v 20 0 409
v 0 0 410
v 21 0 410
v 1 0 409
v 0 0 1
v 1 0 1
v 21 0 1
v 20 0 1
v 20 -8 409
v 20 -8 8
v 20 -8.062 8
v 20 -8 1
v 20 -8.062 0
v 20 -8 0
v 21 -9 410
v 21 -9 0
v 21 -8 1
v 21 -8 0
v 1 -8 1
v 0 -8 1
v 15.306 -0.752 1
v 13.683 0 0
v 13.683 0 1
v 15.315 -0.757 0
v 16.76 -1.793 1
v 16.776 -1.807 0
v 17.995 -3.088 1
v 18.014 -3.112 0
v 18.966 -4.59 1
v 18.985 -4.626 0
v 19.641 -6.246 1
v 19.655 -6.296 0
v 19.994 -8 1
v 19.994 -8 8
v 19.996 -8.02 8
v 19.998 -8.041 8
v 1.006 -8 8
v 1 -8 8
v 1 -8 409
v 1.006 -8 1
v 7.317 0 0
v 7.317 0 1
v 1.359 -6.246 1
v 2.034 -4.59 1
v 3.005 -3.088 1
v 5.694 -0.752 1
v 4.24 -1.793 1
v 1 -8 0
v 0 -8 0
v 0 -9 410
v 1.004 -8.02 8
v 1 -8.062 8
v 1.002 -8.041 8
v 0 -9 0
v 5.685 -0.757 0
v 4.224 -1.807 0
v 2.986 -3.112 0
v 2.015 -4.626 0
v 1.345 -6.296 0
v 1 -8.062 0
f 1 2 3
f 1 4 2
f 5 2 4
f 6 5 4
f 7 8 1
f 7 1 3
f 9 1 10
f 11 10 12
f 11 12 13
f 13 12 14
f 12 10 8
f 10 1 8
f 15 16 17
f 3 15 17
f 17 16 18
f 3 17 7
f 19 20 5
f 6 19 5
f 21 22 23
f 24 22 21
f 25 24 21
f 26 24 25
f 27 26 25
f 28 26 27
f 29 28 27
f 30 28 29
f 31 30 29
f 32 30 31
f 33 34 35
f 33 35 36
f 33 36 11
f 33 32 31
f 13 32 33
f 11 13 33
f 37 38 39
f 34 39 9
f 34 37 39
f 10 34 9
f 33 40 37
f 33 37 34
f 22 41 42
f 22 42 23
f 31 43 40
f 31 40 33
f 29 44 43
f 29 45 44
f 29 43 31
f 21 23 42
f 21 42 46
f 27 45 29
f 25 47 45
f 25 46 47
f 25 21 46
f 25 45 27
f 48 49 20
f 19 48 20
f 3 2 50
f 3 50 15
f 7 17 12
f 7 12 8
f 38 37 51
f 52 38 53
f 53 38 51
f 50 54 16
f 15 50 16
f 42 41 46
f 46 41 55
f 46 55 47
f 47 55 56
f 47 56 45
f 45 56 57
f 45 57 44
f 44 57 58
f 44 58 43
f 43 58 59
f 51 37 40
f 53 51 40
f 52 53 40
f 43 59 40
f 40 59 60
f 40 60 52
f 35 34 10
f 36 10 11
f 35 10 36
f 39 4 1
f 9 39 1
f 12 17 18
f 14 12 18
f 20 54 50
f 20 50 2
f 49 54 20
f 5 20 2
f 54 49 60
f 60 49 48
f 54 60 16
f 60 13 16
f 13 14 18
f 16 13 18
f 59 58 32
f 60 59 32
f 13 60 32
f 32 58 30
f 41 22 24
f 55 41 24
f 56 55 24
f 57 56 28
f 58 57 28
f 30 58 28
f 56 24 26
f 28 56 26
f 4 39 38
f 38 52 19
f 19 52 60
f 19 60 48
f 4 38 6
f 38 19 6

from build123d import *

# Parameters (mm, degrees)
SKETCH1_W           = 21
SKETCH1_H           = 9
BOSS_EXTRUDE1_DEPTH = 410
SKETCH2_W           = 19
SKETCH2_H           = 408
CUT_EXTRUDE1_DEPTH  = 8
CUT_EXTRUDE2_DEPTH  = 8
SKETCH5_W           = 1
SKETCH5_H           = 8
CUT_EXTRUDE3_DEPTH  = 1
SKETCH6_W           = 1
SKETCH6_H           = 8
CUT_EXTRUDE4_DEPTH  = 1


with BuildPart() as part:
    # Sketch1 → Boss-Extrude1 (new body)
    with BuildSketch(Plane.XY):
        with Locations((10.5, -4.5)):
            Rectangle(SKETCH1_W, SKETCH1_H)
    extrude(amount=BOSS_EXTRUDE1_DEPTH)

    # Sketch2 → Cut-Extrude1 (cut)
    with BuildSketch(Plane(origin=(0, 0, 0), x_dir=(1, 0, 0), z_dir=(0, 1, 0))):
        with Locations((10.5, -205)):
            Rectangle(SKETCH2_W, SKETCH2_H)
    extrude(amount=-CUT_EXTRUDE1_DEPTH, mode=Mode.SUBTRACT)

    # Sketch4 → Cut-Extrude2 (cut)
    with BuildSketch(Plane(origin=(0, 0, 0), x_dir=(-1, 0, 0), z_dir=(0, 0, -1))):
        with BuildLine():
            Line((-20, -8.061503552), (-20, 0))
            Line((-20, 0), (-13.682887931, 0))
            ThreePointArc((-13.682887931, 0), (-18.014044946, -3.111884501), (-20, -8.061503552))
        make_face()
        with BuildLine():
            Line((-1, 0), (-7.317112069, 0))
            ThreePointArc((-7.317112069, 0), (-2.985955054, -3.111884501), (-1, -8.061503552))
            Line((-1, -8.061503552), (-1, 0))
        make_face()
    extrude(amount=-CUT_EXTRUDE2_DEPTH, mode=Mode.SUBTRACT)

    # Sketch5 → Cut-Extrude3 (cut)
    with BuildSketch(Plane(origin=(21, 0, 0), x_dir=(0, 0, -1), z_dir=(1, 0, 0))):
        with Locations((-0.5, -4)):
            Rectangle(SKETCH5_W, SKETCH5_H)
    extrude(amount=-CUT_EXTRUDE3_DEPTH, mode=Mode.SUBTRACT)

    # Sketch6 → Cut-Extrude4 (cut)
    with BuildSketch(Plane.ZY):
        with Locations((0.5, -4)):
            Rectangle(SKETCH6_W, SKETCH6_H)
    extrude(amount=-CUT_EXTRUDE4_DEPTH, mode=Mode.SUBTRACT)


solid = part.part
